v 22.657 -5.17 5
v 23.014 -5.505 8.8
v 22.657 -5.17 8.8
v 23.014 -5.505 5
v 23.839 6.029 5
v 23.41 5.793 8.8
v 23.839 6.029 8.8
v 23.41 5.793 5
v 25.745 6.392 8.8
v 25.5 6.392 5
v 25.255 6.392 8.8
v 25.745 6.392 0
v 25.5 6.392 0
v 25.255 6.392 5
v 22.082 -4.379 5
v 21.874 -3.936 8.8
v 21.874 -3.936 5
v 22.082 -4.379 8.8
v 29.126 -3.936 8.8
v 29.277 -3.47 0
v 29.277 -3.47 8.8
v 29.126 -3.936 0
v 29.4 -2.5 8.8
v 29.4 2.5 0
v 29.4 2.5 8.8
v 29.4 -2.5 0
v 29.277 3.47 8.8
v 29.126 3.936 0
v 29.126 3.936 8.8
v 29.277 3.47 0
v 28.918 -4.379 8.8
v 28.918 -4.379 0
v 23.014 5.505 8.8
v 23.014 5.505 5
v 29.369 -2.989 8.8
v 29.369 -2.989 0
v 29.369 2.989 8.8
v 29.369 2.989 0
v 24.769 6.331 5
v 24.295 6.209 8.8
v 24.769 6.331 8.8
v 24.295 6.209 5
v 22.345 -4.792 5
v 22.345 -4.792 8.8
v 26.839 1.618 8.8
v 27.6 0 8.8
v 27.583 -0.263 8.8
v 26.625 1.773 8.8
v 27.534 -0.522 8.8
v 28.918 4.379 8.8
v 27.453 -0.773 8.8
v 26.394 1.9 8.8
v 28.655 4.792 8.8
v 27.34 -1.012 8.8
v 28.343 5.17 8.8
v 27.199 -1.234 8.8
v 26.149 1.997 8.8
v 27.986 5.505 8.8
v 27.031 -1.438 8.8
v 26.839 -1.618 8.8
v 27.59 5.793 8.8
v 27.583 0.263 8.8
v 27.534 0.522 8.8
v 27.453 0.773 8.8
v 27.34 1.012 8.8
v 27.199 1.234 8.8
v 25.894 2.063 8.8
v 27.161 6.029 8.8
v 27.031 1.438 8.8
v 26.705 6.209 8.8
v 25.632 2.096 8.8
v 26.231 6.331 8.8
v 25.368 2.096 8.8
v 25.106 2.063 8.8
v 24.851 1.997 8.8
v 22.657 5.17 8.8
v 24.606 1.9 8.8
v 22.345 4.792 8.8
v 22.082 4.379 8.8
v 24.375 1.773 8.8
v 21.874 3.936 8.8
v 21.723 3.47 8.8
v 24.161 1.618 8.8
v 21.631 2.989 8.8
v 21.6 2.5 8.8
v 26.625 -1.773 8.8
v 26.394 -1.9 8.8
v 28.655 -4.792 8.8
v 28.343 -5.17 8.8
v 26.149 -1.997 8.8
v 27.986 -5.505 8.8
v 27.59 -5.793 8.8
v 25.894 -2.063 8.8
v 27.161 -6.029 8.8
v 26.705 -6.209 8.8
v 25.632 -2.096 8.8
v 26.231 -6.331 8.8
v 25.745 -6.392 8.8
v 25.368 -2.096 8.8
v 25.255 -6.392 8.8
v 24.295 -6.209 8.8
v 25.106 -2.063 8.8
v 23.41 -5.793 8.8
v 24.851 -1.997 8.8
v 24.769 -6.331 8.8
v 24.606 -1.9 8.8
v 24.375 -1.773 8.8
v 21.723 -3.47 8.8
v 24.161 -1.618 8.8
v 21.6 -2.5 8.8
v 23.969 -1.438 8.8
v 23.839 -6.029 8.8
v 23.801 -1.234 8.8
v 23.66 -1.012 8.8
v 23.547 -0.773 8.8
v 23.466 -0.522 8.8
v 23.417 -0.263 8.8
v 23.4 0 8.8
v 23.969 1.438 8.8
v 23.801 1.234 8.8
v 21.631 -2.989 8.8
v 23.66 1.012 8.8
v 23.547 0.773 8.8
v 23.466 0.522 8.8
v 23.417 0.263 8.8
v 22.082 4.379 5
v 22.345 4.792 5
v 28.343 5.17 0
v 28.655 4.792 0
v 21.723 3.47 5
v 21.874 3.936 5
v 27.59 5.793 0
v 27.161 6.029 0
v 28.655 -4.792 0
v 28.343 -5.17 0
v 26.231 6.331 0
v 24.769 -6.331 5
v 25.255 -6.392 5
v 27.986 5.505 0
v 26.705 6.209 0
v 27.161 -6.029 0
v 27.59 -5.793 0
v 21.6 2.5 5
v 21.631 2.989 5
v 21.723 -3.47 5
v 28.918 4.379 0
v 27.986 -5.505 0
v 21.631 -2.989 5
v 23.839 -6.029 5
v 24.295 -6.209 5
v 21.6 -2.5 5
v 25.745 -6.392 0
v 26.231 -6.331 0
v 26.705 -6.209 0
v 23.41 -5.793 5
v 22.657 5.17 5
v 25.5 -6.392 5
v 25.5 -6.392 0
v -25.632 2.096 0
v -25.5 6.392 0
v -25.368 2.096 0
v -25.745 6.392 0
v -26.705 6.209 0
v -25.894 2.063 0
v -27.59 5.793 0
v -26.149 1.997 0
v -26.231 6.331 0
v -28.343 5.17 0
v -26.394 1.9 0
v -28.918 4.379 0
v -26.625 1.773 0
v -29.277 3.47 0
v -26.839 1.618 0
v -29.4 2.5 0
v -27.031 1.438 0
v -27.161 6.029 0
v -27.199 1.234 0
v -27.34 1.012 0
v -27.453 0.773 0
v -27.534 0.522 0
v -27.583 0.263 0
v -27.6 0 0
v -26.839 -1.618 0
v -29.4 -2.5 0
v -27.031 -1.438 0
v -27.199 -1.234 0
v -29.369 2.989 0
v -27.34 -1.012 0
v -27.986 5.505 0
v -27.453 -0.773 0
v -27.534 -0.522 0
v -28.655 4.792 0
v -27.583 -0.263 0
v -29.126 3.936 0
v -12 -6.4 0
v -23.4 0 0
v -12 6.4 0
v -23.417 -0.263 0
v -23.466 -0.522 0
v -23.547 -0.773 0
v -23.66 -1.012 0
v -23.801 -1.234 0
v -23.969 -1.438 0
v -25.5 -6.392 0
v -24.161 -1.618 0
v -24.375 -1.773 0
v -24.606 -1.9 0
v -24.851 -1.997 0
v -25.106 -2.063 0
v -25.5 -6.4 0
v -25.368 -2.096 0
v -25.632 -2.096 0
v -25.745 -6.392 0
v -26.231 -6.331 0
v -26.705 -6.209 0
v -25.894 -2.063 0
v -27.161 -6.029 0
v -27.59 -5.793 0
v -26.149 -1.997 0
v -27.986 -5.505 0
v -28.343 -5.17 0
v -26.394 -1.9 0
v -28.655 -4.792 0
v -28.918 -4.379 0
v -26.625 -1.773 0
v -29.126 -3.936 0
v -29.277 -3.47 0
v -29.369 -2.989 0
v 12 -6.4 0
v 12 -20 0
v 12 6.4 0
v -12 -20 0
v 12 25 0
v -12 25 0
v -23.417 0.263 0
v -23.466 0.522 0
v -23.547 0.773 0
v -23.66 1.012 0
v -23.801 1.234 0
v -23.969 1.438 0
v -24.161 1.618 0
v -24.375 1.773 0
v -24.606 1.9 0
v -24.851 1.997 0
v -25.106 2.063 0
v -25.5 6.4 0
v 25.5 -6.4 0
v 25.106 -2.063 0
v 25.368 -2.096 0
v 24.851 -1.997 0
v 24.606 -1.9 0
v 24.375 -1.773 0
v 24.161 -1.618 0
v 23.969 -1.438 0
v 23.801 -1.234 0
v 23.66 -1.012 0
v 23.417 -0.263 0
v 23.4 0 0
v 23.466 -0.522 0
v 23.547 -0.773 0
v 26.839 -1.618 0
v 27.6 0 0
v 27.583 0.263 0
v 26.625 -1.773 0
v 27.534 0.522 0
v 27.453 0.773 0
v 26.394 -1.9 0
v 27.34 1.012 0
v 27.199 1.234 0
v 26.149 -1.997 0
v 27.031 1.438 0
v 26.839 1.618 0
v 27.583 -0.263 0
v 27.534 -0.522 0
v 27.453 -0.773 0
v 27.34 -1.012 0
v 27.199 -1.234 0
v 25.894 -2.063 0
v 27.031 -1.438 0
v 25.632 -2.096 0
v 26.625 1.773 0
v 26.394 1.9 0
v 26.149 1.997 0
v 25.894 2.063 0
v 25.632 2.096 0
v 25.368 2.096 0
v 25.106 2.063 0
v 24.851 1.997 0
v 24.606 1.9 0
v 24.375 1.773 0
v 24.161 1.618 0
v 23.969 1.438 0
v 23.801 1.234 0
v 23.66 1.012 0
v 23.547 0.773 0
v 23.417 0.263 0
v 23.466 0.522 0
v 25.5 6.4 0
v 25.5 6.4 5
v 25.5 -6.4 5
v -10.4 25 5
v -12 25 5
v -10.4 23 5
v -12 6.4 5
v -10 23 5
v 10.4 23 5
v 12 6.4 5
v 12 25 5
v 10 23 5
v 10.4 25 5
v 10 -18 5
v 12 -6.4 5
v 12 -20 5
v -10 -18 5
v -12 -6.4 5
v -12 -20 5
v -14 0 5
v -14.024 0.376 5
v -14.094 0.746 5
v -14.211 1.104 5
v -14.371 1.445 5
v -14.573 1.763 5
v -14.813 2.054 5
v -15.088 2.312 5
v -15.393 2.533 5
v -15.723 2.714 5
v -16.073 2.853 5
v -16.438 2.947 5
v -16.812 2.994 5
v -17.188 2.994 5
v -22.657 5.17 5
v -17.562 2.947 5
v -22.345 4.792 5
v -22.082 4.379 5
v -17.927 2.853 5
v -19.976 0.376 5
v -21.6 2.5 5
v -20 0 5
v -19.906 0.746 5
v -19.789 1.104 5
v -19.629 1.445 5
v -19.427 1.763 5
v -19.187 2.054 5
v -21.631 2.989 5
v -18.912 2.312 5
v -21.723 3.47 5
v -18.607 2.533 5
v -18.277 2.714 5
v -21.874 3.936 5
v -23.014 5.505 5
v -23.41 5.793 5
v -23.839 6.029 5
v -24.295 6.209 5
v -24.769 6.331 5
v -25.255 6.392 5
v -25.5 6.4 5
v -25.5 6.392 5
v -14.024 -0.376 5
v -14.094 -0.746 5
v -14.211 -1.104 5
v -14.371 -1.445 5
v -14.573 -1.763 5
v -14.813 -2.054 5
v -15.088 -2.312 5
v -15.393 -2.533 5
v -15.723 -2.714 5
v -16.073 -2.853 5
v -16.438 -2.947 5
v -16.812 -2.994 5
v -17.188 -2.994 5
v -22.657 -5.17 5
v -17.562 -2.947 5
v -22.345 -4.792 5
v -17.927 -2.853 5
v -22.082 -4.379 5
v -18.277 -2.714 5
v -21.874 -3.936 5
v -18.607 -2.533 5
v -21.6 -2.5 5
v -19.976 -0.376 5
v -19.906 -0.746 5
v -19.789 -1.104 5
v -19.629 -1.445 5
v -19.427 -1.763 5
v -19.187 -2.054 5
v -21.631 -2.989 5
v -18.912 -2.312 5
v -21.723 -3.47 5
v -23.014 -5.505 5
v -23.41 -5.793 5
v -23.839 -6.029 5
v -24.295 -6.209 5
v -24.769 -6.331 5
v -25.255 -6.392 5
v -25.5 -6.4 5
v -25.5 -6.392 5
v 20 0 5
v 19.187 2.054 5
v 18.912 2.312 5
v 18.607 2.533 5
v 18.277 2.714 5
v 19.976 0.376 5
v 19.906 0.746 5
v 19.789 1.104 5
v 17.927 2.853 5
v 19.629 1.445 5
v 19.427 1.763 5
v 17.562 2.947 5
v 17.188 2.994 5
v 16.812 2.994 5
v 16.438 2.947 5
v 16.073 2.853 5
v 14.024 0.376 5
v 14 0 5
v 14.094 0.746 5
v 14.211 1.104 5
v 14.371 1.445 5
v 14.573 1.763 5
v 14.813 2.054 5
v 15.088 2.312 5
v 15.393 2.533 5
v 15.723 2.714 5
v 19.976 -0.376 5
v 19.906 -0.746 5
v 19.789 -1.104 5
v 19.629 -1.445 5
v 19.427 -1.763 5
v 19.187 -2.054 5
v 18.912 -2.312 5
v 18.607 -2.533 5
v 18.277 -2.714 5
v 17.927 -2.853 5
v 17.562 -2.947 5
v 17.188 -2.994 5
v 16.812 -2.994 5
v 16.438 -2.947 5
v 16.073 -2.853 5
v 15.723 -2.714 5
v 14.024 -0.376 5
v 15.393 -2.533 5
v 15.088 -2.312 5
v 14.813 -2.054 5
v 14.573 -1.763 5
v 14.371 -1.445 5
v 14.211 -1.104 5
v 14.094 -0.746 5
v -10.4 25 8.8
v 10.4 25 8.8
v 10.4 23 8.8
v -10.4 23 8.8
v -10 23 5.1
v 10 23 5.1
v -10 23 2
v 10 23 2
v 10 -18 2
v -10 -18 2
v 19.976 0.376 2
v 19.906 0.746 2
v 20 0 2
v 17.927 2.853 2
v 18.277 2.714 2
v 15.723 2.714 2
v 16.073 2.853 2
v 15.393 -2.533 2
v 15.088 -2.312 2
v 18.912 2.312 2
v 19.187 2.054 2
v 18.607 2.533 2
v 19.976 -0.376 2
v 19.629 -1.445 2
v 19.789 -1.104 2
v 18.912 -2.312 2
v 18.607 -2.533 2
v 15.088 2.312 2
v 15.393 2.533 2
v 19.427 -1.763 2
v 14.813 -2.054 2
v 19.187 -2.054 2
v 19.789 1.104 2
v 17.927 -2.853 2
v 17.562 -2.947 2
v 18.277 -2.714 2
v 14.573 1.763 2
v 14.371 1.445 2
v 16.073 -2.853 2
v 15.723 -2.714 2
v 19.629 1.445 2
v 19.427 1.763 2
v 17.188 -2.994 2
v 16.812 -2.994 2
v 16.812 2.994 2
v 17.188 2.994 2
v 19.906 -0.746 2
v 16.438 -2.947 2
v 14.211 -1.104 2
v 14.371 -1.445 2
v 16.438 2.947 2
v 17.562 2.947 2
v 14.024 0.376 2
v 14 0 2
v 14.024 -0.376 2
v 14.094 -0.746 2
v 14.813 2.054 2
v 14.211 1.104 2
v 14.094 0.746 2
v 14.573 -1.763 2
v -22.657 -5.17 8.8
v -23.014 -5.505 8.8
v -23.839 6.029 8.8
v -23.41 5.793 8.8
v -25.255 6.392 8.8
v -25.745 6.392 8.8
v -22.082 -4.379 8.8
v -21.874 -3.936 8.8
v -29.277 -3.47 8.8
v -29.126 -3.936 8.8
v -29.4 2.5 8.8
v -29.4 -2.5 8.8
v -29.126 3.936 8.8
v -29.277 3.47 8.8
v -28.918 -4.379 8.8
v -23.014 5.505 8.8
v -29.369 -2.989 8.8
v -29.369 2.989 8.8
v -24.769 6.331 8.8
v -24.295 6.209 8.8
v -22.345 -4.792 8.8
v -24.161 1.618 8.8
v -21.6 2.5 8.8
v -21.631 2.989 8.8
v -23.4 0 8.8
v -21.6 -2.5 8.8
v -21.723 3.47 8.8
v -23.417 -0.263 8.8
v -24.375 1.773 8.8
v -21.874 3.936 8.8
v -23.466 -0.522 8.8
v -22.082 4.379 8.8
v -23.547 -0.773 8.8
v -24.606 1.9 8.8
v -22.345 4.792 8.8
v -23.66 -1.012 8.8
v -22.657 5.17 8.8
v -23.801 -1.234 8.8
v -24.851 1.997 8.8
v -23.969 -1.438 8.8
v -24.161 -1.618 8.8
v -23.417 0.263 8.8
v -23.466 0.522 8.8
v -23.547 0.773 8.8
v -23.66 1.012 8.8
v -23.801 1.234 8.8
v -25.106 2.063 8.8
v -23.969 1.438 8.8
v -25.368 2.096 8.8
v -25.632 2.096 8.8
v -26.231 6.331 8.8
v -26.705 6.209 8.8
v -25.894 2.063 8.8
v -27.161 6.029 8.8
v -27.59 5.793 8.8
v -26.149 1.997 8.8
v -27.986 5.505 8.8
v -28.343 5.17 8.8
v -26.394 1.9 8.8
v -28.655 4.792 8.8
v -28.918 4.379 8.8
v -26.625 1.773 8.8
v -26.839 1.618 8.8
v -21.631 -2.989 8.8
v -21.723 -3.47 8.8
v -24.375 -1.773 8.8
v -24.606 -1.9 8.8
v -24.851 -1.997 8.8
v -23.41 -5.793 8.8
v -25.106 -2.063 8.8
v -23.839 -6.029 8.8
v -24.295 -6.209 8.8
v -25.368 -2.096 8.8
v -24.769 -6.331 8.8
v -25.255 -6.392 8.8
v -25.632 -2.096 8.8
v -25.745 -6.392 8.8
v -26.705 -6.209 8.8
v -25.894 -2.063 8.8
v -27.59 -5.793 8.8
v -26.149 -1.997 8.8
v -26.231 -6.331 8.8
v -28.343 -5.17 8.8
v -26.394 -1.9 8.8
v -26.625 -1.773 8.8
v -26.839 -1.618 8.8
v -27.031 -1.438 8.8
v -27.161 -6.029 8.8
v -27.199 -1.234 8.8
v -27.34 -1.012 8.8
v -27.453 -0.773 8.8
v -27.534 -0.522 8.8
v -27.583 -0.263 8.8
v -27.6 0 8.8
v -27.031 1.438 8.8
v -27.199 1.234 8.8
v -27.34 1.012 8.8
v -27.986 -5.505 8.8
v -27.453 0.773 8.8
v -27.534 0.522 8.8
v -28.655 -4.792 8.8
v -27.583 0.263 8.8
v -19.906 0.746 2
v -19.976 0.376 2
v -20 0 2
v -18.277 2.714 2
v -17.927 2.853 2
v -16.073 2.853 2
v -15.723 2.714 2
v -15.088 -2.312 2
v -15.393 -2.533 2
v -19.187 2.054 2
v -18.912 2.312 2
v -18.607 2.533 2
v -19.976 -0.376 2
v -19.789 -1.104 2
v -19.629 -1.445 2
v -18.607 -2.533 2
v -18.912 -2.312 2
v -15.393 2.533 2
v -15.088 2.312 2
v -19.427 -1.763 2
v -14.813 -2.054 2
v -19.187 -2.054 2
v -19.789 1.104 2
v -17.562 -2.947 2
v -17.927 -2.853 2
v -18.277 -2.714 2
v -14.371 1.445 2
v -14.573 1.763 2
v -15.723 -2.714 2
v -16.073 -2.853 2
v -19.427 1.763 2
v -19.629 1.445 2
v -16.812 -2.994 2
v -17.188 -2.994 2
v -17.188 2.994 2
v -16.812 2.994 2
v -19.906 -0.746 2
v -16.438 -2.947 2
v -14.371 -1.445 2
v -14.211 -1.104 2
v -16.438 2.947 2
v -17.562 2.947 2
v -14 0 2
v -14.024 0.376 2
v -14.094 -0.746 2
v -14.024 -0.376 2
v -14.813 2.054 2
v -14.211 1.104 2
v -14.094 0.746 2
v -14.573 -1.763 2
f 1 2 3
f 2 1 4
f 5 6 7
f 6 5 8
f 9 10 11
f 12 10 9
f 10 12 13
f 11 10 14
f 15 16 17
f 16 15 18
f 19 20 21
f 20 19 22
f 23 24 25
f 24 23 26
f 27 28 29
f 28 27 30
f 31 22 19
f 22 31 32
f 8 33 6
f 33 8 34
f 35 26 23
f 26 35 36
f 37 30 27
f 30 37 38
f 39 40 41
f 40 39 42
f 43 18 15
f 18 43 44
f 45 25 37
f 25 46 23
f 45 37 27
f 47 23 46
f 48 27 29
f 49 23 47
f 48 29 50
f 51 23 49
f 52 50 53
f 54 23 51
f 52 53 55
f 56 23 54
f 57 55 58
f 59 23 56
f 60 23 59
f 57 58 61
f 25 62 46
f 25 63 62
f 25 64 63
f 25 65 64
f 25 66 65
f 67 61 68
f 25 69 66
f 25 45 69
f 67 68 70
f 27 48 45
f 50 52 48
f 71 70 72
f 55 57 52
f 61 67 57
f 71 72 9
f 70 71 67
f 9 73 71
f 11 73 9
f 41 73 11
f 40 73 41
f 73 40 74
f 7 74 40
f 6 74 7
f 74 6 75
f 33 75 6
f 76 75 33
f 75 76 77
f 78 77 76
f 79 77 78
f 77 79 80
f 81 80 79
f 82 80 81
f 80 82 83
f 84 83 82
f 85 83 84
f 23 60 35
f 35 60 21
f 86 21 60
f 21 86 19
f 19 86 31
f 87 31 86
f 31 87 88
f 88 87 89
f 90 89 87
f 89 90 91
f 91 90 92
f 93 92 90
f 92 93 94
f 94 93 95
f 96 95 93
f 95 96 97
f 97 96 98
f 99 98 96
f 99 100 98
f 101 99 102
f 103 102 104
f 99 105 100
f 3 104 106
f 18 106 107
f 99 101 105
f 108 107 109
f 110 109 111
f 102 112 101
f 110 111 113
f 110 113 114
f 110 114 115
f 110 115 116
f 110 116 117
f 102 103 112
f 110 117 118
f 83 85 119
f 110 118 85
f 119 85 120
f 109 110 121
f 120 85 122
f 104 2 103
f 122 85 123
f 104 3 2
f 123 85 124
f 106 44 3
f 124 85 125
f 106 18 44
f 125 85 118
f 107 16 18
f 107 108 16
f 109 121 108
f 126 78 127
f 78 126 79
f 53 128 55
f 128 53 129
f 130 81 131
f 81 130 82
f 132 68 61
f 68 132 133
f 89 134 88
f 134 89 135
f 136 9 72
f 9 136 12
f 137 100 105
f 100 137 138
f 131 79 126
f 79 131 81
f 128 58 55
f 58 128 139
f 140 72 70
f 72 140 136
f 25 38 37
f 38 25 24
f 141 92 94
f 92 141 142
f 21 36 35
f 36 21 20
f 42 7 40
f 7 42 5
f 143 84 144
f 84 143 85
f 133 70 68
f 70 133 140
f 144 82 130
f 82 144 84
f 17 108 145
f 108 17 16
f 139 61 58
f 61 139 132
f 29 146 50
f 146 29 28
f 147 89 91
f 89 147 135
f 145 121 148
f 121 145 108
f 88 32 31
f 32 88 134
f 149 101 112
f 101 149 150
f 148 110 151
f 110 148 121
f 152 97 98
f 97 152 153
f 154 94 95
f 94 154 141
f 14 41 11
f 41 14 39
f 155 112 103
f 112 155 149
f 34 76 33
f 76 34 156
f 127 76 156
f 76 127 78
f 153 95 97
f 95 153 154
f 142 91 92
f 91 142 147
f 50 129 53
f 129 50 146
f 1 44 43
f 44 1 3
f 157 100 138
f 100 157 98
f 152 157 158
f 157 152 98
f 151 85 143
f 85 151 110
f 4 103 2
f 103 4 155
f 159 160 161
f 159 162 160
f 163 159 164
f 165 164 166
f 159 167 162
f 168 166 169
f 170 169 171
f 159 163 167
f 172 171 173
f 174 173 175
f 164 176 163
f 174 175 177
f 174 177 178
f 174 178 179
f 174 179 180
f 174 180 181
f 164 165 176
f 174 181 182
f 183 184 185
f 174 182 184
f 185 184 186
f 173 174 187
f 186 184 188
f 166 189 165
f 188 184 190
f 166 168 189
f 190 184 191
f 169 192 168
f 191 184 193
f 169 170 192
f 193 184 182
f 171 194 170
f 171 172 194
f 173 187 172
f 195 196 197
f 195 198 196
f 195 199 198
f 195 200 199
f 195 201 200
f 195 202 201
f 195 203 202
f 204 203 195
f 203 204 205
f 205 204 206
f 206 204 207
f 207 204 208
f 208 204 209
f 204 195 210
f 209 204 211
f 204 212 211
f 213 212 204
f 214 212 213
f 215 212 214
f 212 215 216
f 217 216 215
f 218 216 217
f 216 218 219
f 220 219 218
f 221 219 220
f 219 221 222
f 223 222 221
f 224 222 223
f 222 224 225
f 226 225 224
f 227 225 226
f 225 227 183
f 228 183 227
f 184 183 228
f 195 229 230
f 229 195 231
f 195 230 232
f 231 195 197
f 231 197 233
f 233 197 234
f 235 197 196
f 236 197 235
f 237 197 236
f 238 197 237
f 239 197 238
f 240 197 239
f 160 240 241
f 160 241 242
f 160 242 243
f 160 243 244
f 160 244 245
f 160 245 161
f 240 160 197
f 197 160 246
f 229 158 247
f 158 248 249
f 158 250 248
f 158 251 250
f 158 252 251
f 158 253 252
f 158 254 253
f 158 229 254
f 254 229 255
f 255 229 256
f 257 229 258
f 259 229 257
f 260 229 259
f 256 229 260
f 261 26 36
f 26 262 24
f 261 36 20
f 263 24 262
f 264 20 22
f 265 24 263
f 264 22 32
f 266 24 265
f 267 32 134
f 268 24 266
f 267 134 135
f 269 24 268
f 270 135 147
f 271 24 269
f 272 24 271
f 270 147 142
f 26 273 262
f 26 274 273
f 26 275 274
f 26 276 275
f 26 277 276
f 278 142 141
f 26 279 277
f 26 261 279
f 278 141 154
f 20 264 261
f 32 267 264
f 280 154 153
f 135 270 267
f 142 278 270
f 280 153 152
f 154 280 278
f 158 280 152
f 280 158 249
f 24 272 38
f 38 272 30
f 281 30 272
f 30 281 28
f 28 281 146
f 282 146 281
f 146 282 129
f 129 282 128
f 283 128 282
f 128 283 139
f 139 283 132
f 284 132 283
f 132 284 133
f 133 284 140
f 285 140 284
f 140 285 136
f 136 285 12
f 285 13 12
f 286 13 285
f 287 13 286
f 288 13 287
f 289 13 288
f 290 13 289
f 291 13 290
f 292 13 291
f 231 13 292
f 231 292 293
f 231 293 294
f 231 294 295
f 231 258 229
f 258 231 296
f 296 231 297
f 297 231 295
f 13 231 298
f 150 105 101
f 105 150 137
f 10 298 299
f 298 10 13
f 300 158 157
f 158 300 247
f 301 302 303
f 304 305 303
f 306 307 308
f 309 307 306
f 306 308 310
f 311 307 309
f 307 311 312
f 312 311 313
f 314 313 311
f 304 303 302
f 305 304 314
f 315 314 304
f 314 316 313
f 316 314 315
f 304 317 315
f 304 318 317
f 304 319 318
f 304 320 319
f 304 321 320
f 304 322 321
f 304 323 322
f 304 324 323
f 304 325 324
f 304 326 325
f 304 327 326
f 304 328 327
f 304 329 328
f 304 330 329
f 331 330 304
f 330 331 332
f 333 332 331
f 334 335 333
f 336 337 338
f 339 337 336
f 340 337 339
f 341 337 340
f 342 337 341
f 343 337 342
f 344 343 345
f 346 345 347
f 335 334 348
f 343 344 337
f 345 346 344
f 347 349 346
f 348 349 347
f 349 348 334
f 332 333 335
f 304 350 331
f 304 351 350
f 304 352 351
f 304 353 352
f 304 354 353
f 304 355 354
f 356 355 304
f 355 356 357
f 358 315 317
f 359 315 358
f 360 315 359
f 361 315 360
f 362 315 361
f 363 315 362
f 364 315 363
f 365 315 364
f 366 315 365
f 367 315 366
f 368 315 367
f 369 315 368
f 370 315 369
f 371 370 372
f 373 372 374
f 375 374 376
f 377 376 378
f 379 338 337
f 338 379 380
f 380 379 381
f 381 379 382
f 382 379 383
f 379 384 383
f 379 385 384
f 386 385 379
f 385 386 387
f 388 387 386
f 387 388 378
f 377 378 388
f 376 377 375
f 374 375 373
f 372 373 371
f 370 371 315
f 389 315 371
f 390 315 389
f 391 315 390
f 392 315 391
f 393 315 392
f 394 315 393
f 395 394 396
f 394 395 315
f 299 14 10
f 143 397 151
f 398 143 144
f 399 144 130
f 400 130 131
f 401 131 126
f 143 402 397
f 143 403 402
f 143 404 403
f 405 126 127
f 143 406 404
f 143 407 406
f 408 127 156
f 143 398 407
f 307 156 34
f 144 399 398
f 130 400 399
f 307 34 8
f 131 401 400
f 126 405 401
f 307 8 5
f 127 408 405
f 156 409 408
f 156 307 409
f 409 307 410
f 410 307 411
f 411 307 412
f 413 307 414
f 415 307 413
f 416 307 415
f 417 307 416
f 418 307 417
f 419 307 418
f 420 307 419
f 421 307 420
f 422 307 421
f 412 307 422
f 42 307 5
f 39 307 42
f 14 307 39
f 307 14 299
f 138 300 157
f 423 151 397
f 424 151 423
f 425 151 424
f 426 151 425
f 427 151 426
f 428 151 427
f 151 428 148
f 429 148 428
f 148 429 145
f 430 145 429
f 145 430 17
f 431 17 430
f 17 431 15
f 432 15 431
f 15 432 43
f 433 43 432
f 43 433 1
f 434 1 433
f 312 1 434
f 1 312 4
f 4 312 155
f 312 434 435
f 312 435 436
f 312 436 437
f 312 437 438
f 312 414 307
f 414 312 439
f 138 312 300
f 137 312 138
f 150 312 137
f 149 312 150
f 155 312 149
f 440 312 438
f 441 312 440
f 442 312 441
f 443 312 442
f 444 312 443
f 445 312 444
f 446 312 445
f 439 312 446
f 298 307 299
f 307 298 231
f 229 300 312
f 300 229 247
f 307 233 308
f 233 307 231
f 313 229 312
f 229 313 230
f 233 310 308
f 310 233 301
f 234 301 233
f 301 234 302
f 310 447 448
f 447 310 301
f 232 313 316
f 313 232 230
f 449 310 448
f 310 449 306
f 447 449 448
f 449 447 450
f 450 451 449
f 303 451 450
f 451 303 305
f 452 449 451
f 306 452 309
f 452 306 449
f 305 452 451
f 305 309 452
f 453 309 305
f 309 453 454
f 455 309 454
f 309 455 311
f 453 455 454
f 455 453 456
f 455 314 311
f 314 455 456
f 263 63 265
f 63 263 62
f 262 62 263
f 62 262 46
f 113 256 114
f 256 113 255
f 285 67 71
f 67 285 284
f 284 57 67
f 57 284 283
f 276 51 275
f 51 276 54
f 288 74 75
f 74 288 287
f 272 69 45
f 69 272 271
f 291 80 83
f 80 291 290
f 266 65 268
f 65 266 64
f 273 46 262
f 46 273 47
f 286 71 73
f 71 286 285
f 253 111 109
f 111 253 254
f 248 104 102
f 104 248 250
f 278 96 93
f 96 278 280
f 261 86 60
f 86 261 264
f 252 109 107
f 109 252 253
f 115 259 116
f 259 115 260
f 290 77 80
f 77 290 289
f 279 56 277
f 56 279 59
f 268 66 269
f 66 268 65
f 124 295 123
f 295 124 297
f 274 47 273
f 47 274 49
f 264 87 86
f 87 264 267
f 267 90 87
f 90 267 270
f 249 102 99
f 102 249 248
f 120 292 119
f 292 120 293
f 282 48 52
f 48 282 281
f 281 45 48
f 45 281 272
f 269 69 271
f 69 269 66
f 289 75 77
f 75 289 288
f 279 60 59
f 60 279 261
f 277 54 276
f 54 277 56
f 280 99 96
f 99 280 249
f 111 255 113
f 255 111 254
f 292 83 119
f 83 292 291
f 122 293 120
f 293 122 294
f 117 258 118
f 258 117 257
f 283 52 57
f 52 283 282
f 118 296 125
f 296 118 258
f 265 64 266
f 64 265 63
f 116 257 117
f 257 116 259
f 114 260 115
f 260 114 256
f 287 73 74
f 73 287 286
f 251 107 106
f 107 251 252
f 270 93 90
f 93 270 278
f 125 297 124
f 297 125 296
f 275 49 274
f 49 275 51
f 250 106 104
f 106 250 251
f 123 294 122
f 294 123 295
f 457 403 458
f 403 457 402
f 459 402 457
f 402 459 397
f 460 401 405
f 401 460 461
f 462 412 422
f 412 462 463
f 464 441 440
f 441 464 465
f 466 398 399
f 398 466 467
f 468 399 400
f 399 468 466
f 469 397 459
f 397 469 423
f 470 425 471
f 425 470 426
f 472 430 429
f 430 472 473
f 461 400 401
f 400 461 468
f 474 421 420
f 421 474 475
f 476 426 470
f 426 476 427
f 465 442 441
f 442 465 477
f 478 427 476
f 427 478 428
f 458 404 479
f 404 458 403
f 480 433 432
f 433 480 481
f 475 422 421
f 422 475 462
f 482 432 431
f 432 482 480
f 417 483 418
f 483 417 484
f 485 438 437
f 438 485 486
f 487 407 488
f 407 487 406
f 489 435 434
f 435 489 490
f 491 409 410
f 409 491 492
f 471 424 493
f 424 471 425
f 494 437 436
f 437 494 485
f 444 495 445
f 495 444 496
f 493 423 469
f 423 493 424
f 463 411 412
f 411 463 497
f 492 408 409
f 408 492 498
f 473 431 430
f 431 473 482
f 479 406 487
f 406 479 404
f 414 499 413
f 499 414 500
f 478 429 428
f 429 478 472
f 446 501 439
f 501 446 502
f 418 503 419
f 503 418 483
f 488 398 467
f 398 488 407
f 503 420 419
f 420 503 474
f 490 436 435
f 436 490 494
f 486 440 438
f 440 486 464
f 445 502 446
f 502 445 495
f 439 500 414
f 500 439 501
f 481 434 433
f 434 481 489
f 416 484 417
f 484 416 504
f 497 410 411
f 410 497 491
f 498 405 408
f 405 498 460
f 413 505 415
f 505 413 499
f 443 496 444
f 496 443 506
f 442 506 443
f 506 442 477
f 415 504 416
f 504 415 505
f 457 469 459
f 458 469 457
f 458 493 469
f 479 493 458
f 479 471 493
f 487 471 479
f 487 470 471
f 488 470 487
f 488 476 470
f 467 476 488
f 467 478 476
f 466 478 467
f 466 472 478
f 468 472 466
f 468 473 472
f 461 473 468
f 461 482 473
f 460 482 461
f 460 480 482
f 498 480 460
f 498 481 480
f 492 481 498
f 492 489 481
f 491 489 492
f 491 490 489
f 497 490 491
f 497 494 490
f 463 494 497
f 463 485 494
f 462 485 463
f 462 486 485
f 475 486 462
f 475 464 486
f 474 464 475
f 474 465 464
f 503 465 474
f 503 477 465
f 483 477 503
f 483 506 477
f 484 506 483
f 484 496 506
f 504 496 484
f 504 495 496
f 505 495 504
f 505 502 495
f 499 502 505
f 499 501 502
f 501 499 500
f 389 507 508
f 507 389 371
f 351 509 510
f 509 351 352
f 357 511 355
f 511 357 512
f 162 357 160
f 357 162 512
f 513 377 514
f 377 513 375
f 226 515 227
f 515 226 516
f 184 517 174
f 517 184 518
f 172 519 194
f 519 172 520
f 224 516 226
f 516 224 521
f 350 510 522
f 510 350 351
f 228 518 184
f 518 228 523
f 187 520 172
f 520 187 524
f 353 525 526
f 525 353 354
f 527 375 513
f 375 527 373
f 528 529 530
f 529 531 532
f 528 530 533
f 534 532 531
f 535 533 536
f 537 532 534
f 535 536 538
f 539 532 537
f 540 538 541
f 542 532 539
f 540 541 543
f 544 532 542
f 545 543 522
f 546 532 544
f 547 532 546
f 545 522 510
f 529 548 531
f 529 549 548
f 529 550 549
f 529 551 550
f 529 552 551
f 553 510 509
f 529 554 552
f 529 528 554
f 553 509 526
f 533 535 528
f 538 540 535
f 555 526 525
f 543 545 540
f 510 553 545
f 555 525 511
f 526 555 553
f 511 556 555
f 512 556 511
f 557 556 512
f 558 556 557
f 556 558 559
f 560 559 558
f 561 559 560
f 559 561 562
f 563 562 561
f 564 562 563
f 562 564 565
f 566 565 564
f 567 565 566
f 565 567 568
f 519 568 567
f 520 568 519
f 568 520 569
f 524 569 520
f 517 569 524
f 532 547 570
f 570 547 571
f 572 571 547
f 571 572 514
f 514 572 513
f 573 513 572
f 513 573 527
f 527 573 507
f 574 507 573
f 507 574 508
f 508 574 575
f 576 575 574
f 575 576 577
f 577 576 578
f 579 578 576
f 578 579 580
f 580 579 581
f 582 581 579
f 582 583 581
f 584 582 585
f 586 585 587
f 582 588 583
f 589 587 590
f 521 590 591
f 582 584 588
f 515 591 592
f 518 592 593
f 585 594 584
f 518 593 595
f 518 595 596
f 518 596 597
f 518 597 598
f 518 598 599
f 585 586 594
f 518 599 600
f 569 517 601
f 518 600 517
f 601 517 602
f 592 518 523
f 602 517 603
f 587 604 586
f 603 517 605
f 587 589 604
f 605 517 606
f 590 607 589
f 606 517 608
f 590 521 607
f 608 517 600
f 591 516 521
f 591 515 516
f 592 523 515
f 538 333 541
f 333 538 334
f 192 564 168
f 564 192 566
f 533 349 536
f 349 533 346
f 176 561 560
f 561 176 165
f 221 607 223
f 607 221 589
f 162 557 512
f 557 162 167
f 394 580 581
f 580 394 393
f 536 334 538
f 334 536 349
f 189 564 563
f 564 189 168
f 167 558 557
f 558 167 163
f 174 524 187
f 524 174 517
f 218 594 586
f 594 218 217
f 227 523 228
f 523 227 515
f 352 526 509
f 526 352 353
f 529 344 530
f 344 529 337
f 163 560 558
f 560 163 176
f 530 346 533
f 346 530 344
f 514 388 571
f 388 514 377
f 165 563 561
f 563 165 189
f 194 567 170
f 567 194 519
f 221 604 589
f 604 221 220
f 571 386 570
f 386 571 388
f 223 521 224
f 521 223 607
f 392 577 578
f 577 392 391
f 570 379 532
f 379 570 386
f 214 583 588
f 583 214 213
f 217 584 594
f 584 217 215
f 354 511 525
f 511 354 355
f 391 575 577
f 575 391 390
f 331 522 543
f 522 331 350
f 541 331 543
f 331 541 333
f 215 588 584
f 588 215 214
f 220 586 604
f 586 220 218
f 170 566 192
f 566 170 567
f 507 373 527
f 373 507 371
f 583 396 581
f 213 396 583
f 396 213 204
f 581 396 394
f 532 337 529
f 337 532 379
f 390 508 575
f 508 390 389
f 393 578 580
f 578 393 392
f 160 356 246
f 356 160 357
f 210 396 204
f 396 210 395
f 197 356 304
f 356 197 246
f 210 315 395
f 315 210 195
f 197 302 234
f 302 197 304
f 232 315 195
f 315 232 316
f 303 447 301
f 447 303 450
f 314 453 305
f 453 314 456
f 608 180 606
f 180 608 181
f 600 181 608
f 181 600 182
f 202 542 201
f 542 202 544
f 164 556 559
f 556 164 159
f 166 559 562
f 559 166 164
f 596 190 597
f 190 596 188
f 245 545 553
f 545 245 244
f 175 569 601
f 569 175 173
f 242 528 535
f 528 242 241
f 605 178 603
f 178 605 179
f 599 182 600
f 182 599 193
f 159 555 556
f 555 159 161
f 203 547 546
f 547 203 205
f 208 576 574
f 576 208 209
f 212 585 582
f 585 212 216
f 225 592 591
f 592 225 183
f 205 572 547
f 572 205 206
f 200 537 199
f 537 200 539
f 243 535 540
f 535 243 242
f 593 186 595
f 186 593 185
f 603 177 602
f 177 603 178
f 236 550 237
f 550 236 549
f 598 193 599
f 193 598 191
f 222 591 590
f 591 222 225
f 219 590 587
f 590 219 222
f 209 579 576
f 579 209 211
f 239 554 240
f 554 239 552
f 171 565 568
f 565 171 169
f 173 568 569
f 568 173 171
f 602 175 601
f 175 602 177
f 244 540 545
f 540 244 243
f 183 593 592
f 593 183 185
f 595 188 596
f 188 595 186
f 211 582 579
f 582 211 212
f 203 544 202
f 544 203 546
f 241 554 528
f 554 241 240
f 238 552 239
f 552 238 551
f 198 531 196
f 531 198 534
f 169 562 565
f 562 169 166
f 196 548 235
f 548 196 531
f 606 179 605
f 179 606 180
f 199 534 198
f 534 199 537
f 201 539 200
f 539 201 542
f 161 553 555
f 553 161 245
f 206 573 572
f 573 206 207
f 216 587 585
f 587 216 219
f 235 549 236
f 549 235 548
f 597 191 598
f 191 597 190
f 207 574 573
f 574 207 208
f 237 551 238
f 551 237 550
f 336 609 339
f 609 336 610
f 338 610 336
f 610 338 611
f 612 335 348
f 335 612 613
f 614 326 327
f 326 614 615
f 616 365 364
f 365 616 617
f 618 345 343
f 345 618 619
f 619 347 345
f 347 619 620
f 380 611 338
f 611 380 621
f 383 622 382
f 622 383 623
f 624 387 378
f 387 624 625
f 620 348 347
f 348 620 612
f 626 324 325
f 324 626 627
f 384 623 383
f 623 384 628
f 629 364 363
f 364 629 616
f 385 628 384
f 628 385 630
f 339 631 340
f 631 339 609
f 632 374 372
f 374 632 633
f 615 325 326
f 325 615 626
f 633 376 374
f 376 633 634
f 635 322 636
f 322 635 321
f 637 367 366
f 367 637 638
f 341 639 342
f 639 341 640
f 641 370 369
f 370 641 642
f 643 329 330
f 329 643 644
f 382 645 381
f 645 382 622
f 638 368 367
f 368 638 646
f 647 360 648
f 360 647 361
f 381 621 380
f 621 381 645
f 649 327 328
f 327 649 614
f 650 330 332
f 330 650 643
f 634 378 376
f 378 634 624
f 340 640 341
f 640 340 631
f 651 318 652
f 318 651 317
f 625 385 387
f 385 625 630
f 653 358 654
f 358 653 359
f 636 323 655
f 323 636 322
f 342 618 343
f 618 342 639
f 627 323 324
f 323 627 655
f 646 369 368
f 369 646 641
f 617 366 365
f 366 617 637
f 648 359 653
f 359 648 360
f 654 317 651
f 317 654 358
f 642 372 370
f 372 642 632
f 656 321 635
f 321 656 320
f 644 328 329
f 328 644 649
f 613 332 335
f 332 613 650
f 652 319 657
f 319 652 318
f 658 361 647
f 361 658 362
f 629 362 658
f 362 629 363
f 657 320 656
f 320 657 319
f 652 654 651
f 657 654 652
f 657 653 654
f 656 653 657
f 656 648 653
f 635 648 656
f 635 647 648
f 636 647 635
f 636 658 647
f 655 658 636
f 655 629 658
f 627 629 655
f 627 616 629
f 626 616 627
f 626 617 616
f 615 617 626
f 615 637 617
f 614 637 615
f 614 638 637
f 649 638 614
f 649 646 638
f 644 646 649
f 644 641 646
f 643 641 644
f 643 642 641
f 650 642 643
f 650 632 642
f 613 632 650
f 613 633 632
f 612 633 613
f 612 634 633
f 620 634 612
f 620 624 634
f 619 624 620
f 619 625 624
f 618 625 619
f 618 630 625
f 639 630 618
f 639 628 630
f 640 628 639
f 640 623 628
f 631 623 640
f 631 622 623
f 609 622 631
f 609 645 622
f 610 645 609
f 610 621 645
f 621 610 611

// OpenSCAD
// Copyright 2019 Marcos Del Sol Vives
// SPDX-License-Identifier: ISC

$fn = 50;

insert_diameter = 7.8;
insert_len = 12.8;
insert_center_x = 51 / 2;
insert_height = 3.8;

wall_height = 3;
wall_thickness = 2;
tab_width = 20.8;

screw_diameter = 4.2;

box_width = 24;
box_bottom = 20;
box_top = 25;

symbol_center_x = 17;
symbol_diameter = 6;

module half() {
	difference() {
		union() {
			hull() {
				for (s = [-1 : 2 : 1]) {
					translate([insert_center_x, s * (insert_len-insert_diameter)/2, 0])
						cylinder(d=insert_diameter, h=insert_height+wall_height+wall_thickness);
				}
			}

			translate([0, -insert_len / 2, 0])
				cube([insert_center_x, insert_len, wall_thickness+wall_height]);
			translate([0, -box_bottom, 0])
				cube([box_width/2, box_top + box_bottom, wall_thickness+wall_height]);
			translate([0, box_top - wall_thickness, wall_thickness+wall_height])
				cube([tab_width / 2, wall_thickness, insert_height]);
		}

		translate([0, -box_bottom+wall_thickness, wall_thickness])
			cube([box_width / 2 - wall_thickness, box_top + box_bottom - 2 * wall_thickness, wall_height + 0.1]);
		
		translate([insert_center_x, 0, 0])
			cylinder(d=screw_diameter, h=wall_thickness+wall_height+insert_height+0.1);
		
		translate([symbol_center_x, 0, wall_thickness])
			cylinder(d=symbol_diameter, h=wall_height+0.1);
	}
}

half();
mirror([-1, 0, 0])
	half();
